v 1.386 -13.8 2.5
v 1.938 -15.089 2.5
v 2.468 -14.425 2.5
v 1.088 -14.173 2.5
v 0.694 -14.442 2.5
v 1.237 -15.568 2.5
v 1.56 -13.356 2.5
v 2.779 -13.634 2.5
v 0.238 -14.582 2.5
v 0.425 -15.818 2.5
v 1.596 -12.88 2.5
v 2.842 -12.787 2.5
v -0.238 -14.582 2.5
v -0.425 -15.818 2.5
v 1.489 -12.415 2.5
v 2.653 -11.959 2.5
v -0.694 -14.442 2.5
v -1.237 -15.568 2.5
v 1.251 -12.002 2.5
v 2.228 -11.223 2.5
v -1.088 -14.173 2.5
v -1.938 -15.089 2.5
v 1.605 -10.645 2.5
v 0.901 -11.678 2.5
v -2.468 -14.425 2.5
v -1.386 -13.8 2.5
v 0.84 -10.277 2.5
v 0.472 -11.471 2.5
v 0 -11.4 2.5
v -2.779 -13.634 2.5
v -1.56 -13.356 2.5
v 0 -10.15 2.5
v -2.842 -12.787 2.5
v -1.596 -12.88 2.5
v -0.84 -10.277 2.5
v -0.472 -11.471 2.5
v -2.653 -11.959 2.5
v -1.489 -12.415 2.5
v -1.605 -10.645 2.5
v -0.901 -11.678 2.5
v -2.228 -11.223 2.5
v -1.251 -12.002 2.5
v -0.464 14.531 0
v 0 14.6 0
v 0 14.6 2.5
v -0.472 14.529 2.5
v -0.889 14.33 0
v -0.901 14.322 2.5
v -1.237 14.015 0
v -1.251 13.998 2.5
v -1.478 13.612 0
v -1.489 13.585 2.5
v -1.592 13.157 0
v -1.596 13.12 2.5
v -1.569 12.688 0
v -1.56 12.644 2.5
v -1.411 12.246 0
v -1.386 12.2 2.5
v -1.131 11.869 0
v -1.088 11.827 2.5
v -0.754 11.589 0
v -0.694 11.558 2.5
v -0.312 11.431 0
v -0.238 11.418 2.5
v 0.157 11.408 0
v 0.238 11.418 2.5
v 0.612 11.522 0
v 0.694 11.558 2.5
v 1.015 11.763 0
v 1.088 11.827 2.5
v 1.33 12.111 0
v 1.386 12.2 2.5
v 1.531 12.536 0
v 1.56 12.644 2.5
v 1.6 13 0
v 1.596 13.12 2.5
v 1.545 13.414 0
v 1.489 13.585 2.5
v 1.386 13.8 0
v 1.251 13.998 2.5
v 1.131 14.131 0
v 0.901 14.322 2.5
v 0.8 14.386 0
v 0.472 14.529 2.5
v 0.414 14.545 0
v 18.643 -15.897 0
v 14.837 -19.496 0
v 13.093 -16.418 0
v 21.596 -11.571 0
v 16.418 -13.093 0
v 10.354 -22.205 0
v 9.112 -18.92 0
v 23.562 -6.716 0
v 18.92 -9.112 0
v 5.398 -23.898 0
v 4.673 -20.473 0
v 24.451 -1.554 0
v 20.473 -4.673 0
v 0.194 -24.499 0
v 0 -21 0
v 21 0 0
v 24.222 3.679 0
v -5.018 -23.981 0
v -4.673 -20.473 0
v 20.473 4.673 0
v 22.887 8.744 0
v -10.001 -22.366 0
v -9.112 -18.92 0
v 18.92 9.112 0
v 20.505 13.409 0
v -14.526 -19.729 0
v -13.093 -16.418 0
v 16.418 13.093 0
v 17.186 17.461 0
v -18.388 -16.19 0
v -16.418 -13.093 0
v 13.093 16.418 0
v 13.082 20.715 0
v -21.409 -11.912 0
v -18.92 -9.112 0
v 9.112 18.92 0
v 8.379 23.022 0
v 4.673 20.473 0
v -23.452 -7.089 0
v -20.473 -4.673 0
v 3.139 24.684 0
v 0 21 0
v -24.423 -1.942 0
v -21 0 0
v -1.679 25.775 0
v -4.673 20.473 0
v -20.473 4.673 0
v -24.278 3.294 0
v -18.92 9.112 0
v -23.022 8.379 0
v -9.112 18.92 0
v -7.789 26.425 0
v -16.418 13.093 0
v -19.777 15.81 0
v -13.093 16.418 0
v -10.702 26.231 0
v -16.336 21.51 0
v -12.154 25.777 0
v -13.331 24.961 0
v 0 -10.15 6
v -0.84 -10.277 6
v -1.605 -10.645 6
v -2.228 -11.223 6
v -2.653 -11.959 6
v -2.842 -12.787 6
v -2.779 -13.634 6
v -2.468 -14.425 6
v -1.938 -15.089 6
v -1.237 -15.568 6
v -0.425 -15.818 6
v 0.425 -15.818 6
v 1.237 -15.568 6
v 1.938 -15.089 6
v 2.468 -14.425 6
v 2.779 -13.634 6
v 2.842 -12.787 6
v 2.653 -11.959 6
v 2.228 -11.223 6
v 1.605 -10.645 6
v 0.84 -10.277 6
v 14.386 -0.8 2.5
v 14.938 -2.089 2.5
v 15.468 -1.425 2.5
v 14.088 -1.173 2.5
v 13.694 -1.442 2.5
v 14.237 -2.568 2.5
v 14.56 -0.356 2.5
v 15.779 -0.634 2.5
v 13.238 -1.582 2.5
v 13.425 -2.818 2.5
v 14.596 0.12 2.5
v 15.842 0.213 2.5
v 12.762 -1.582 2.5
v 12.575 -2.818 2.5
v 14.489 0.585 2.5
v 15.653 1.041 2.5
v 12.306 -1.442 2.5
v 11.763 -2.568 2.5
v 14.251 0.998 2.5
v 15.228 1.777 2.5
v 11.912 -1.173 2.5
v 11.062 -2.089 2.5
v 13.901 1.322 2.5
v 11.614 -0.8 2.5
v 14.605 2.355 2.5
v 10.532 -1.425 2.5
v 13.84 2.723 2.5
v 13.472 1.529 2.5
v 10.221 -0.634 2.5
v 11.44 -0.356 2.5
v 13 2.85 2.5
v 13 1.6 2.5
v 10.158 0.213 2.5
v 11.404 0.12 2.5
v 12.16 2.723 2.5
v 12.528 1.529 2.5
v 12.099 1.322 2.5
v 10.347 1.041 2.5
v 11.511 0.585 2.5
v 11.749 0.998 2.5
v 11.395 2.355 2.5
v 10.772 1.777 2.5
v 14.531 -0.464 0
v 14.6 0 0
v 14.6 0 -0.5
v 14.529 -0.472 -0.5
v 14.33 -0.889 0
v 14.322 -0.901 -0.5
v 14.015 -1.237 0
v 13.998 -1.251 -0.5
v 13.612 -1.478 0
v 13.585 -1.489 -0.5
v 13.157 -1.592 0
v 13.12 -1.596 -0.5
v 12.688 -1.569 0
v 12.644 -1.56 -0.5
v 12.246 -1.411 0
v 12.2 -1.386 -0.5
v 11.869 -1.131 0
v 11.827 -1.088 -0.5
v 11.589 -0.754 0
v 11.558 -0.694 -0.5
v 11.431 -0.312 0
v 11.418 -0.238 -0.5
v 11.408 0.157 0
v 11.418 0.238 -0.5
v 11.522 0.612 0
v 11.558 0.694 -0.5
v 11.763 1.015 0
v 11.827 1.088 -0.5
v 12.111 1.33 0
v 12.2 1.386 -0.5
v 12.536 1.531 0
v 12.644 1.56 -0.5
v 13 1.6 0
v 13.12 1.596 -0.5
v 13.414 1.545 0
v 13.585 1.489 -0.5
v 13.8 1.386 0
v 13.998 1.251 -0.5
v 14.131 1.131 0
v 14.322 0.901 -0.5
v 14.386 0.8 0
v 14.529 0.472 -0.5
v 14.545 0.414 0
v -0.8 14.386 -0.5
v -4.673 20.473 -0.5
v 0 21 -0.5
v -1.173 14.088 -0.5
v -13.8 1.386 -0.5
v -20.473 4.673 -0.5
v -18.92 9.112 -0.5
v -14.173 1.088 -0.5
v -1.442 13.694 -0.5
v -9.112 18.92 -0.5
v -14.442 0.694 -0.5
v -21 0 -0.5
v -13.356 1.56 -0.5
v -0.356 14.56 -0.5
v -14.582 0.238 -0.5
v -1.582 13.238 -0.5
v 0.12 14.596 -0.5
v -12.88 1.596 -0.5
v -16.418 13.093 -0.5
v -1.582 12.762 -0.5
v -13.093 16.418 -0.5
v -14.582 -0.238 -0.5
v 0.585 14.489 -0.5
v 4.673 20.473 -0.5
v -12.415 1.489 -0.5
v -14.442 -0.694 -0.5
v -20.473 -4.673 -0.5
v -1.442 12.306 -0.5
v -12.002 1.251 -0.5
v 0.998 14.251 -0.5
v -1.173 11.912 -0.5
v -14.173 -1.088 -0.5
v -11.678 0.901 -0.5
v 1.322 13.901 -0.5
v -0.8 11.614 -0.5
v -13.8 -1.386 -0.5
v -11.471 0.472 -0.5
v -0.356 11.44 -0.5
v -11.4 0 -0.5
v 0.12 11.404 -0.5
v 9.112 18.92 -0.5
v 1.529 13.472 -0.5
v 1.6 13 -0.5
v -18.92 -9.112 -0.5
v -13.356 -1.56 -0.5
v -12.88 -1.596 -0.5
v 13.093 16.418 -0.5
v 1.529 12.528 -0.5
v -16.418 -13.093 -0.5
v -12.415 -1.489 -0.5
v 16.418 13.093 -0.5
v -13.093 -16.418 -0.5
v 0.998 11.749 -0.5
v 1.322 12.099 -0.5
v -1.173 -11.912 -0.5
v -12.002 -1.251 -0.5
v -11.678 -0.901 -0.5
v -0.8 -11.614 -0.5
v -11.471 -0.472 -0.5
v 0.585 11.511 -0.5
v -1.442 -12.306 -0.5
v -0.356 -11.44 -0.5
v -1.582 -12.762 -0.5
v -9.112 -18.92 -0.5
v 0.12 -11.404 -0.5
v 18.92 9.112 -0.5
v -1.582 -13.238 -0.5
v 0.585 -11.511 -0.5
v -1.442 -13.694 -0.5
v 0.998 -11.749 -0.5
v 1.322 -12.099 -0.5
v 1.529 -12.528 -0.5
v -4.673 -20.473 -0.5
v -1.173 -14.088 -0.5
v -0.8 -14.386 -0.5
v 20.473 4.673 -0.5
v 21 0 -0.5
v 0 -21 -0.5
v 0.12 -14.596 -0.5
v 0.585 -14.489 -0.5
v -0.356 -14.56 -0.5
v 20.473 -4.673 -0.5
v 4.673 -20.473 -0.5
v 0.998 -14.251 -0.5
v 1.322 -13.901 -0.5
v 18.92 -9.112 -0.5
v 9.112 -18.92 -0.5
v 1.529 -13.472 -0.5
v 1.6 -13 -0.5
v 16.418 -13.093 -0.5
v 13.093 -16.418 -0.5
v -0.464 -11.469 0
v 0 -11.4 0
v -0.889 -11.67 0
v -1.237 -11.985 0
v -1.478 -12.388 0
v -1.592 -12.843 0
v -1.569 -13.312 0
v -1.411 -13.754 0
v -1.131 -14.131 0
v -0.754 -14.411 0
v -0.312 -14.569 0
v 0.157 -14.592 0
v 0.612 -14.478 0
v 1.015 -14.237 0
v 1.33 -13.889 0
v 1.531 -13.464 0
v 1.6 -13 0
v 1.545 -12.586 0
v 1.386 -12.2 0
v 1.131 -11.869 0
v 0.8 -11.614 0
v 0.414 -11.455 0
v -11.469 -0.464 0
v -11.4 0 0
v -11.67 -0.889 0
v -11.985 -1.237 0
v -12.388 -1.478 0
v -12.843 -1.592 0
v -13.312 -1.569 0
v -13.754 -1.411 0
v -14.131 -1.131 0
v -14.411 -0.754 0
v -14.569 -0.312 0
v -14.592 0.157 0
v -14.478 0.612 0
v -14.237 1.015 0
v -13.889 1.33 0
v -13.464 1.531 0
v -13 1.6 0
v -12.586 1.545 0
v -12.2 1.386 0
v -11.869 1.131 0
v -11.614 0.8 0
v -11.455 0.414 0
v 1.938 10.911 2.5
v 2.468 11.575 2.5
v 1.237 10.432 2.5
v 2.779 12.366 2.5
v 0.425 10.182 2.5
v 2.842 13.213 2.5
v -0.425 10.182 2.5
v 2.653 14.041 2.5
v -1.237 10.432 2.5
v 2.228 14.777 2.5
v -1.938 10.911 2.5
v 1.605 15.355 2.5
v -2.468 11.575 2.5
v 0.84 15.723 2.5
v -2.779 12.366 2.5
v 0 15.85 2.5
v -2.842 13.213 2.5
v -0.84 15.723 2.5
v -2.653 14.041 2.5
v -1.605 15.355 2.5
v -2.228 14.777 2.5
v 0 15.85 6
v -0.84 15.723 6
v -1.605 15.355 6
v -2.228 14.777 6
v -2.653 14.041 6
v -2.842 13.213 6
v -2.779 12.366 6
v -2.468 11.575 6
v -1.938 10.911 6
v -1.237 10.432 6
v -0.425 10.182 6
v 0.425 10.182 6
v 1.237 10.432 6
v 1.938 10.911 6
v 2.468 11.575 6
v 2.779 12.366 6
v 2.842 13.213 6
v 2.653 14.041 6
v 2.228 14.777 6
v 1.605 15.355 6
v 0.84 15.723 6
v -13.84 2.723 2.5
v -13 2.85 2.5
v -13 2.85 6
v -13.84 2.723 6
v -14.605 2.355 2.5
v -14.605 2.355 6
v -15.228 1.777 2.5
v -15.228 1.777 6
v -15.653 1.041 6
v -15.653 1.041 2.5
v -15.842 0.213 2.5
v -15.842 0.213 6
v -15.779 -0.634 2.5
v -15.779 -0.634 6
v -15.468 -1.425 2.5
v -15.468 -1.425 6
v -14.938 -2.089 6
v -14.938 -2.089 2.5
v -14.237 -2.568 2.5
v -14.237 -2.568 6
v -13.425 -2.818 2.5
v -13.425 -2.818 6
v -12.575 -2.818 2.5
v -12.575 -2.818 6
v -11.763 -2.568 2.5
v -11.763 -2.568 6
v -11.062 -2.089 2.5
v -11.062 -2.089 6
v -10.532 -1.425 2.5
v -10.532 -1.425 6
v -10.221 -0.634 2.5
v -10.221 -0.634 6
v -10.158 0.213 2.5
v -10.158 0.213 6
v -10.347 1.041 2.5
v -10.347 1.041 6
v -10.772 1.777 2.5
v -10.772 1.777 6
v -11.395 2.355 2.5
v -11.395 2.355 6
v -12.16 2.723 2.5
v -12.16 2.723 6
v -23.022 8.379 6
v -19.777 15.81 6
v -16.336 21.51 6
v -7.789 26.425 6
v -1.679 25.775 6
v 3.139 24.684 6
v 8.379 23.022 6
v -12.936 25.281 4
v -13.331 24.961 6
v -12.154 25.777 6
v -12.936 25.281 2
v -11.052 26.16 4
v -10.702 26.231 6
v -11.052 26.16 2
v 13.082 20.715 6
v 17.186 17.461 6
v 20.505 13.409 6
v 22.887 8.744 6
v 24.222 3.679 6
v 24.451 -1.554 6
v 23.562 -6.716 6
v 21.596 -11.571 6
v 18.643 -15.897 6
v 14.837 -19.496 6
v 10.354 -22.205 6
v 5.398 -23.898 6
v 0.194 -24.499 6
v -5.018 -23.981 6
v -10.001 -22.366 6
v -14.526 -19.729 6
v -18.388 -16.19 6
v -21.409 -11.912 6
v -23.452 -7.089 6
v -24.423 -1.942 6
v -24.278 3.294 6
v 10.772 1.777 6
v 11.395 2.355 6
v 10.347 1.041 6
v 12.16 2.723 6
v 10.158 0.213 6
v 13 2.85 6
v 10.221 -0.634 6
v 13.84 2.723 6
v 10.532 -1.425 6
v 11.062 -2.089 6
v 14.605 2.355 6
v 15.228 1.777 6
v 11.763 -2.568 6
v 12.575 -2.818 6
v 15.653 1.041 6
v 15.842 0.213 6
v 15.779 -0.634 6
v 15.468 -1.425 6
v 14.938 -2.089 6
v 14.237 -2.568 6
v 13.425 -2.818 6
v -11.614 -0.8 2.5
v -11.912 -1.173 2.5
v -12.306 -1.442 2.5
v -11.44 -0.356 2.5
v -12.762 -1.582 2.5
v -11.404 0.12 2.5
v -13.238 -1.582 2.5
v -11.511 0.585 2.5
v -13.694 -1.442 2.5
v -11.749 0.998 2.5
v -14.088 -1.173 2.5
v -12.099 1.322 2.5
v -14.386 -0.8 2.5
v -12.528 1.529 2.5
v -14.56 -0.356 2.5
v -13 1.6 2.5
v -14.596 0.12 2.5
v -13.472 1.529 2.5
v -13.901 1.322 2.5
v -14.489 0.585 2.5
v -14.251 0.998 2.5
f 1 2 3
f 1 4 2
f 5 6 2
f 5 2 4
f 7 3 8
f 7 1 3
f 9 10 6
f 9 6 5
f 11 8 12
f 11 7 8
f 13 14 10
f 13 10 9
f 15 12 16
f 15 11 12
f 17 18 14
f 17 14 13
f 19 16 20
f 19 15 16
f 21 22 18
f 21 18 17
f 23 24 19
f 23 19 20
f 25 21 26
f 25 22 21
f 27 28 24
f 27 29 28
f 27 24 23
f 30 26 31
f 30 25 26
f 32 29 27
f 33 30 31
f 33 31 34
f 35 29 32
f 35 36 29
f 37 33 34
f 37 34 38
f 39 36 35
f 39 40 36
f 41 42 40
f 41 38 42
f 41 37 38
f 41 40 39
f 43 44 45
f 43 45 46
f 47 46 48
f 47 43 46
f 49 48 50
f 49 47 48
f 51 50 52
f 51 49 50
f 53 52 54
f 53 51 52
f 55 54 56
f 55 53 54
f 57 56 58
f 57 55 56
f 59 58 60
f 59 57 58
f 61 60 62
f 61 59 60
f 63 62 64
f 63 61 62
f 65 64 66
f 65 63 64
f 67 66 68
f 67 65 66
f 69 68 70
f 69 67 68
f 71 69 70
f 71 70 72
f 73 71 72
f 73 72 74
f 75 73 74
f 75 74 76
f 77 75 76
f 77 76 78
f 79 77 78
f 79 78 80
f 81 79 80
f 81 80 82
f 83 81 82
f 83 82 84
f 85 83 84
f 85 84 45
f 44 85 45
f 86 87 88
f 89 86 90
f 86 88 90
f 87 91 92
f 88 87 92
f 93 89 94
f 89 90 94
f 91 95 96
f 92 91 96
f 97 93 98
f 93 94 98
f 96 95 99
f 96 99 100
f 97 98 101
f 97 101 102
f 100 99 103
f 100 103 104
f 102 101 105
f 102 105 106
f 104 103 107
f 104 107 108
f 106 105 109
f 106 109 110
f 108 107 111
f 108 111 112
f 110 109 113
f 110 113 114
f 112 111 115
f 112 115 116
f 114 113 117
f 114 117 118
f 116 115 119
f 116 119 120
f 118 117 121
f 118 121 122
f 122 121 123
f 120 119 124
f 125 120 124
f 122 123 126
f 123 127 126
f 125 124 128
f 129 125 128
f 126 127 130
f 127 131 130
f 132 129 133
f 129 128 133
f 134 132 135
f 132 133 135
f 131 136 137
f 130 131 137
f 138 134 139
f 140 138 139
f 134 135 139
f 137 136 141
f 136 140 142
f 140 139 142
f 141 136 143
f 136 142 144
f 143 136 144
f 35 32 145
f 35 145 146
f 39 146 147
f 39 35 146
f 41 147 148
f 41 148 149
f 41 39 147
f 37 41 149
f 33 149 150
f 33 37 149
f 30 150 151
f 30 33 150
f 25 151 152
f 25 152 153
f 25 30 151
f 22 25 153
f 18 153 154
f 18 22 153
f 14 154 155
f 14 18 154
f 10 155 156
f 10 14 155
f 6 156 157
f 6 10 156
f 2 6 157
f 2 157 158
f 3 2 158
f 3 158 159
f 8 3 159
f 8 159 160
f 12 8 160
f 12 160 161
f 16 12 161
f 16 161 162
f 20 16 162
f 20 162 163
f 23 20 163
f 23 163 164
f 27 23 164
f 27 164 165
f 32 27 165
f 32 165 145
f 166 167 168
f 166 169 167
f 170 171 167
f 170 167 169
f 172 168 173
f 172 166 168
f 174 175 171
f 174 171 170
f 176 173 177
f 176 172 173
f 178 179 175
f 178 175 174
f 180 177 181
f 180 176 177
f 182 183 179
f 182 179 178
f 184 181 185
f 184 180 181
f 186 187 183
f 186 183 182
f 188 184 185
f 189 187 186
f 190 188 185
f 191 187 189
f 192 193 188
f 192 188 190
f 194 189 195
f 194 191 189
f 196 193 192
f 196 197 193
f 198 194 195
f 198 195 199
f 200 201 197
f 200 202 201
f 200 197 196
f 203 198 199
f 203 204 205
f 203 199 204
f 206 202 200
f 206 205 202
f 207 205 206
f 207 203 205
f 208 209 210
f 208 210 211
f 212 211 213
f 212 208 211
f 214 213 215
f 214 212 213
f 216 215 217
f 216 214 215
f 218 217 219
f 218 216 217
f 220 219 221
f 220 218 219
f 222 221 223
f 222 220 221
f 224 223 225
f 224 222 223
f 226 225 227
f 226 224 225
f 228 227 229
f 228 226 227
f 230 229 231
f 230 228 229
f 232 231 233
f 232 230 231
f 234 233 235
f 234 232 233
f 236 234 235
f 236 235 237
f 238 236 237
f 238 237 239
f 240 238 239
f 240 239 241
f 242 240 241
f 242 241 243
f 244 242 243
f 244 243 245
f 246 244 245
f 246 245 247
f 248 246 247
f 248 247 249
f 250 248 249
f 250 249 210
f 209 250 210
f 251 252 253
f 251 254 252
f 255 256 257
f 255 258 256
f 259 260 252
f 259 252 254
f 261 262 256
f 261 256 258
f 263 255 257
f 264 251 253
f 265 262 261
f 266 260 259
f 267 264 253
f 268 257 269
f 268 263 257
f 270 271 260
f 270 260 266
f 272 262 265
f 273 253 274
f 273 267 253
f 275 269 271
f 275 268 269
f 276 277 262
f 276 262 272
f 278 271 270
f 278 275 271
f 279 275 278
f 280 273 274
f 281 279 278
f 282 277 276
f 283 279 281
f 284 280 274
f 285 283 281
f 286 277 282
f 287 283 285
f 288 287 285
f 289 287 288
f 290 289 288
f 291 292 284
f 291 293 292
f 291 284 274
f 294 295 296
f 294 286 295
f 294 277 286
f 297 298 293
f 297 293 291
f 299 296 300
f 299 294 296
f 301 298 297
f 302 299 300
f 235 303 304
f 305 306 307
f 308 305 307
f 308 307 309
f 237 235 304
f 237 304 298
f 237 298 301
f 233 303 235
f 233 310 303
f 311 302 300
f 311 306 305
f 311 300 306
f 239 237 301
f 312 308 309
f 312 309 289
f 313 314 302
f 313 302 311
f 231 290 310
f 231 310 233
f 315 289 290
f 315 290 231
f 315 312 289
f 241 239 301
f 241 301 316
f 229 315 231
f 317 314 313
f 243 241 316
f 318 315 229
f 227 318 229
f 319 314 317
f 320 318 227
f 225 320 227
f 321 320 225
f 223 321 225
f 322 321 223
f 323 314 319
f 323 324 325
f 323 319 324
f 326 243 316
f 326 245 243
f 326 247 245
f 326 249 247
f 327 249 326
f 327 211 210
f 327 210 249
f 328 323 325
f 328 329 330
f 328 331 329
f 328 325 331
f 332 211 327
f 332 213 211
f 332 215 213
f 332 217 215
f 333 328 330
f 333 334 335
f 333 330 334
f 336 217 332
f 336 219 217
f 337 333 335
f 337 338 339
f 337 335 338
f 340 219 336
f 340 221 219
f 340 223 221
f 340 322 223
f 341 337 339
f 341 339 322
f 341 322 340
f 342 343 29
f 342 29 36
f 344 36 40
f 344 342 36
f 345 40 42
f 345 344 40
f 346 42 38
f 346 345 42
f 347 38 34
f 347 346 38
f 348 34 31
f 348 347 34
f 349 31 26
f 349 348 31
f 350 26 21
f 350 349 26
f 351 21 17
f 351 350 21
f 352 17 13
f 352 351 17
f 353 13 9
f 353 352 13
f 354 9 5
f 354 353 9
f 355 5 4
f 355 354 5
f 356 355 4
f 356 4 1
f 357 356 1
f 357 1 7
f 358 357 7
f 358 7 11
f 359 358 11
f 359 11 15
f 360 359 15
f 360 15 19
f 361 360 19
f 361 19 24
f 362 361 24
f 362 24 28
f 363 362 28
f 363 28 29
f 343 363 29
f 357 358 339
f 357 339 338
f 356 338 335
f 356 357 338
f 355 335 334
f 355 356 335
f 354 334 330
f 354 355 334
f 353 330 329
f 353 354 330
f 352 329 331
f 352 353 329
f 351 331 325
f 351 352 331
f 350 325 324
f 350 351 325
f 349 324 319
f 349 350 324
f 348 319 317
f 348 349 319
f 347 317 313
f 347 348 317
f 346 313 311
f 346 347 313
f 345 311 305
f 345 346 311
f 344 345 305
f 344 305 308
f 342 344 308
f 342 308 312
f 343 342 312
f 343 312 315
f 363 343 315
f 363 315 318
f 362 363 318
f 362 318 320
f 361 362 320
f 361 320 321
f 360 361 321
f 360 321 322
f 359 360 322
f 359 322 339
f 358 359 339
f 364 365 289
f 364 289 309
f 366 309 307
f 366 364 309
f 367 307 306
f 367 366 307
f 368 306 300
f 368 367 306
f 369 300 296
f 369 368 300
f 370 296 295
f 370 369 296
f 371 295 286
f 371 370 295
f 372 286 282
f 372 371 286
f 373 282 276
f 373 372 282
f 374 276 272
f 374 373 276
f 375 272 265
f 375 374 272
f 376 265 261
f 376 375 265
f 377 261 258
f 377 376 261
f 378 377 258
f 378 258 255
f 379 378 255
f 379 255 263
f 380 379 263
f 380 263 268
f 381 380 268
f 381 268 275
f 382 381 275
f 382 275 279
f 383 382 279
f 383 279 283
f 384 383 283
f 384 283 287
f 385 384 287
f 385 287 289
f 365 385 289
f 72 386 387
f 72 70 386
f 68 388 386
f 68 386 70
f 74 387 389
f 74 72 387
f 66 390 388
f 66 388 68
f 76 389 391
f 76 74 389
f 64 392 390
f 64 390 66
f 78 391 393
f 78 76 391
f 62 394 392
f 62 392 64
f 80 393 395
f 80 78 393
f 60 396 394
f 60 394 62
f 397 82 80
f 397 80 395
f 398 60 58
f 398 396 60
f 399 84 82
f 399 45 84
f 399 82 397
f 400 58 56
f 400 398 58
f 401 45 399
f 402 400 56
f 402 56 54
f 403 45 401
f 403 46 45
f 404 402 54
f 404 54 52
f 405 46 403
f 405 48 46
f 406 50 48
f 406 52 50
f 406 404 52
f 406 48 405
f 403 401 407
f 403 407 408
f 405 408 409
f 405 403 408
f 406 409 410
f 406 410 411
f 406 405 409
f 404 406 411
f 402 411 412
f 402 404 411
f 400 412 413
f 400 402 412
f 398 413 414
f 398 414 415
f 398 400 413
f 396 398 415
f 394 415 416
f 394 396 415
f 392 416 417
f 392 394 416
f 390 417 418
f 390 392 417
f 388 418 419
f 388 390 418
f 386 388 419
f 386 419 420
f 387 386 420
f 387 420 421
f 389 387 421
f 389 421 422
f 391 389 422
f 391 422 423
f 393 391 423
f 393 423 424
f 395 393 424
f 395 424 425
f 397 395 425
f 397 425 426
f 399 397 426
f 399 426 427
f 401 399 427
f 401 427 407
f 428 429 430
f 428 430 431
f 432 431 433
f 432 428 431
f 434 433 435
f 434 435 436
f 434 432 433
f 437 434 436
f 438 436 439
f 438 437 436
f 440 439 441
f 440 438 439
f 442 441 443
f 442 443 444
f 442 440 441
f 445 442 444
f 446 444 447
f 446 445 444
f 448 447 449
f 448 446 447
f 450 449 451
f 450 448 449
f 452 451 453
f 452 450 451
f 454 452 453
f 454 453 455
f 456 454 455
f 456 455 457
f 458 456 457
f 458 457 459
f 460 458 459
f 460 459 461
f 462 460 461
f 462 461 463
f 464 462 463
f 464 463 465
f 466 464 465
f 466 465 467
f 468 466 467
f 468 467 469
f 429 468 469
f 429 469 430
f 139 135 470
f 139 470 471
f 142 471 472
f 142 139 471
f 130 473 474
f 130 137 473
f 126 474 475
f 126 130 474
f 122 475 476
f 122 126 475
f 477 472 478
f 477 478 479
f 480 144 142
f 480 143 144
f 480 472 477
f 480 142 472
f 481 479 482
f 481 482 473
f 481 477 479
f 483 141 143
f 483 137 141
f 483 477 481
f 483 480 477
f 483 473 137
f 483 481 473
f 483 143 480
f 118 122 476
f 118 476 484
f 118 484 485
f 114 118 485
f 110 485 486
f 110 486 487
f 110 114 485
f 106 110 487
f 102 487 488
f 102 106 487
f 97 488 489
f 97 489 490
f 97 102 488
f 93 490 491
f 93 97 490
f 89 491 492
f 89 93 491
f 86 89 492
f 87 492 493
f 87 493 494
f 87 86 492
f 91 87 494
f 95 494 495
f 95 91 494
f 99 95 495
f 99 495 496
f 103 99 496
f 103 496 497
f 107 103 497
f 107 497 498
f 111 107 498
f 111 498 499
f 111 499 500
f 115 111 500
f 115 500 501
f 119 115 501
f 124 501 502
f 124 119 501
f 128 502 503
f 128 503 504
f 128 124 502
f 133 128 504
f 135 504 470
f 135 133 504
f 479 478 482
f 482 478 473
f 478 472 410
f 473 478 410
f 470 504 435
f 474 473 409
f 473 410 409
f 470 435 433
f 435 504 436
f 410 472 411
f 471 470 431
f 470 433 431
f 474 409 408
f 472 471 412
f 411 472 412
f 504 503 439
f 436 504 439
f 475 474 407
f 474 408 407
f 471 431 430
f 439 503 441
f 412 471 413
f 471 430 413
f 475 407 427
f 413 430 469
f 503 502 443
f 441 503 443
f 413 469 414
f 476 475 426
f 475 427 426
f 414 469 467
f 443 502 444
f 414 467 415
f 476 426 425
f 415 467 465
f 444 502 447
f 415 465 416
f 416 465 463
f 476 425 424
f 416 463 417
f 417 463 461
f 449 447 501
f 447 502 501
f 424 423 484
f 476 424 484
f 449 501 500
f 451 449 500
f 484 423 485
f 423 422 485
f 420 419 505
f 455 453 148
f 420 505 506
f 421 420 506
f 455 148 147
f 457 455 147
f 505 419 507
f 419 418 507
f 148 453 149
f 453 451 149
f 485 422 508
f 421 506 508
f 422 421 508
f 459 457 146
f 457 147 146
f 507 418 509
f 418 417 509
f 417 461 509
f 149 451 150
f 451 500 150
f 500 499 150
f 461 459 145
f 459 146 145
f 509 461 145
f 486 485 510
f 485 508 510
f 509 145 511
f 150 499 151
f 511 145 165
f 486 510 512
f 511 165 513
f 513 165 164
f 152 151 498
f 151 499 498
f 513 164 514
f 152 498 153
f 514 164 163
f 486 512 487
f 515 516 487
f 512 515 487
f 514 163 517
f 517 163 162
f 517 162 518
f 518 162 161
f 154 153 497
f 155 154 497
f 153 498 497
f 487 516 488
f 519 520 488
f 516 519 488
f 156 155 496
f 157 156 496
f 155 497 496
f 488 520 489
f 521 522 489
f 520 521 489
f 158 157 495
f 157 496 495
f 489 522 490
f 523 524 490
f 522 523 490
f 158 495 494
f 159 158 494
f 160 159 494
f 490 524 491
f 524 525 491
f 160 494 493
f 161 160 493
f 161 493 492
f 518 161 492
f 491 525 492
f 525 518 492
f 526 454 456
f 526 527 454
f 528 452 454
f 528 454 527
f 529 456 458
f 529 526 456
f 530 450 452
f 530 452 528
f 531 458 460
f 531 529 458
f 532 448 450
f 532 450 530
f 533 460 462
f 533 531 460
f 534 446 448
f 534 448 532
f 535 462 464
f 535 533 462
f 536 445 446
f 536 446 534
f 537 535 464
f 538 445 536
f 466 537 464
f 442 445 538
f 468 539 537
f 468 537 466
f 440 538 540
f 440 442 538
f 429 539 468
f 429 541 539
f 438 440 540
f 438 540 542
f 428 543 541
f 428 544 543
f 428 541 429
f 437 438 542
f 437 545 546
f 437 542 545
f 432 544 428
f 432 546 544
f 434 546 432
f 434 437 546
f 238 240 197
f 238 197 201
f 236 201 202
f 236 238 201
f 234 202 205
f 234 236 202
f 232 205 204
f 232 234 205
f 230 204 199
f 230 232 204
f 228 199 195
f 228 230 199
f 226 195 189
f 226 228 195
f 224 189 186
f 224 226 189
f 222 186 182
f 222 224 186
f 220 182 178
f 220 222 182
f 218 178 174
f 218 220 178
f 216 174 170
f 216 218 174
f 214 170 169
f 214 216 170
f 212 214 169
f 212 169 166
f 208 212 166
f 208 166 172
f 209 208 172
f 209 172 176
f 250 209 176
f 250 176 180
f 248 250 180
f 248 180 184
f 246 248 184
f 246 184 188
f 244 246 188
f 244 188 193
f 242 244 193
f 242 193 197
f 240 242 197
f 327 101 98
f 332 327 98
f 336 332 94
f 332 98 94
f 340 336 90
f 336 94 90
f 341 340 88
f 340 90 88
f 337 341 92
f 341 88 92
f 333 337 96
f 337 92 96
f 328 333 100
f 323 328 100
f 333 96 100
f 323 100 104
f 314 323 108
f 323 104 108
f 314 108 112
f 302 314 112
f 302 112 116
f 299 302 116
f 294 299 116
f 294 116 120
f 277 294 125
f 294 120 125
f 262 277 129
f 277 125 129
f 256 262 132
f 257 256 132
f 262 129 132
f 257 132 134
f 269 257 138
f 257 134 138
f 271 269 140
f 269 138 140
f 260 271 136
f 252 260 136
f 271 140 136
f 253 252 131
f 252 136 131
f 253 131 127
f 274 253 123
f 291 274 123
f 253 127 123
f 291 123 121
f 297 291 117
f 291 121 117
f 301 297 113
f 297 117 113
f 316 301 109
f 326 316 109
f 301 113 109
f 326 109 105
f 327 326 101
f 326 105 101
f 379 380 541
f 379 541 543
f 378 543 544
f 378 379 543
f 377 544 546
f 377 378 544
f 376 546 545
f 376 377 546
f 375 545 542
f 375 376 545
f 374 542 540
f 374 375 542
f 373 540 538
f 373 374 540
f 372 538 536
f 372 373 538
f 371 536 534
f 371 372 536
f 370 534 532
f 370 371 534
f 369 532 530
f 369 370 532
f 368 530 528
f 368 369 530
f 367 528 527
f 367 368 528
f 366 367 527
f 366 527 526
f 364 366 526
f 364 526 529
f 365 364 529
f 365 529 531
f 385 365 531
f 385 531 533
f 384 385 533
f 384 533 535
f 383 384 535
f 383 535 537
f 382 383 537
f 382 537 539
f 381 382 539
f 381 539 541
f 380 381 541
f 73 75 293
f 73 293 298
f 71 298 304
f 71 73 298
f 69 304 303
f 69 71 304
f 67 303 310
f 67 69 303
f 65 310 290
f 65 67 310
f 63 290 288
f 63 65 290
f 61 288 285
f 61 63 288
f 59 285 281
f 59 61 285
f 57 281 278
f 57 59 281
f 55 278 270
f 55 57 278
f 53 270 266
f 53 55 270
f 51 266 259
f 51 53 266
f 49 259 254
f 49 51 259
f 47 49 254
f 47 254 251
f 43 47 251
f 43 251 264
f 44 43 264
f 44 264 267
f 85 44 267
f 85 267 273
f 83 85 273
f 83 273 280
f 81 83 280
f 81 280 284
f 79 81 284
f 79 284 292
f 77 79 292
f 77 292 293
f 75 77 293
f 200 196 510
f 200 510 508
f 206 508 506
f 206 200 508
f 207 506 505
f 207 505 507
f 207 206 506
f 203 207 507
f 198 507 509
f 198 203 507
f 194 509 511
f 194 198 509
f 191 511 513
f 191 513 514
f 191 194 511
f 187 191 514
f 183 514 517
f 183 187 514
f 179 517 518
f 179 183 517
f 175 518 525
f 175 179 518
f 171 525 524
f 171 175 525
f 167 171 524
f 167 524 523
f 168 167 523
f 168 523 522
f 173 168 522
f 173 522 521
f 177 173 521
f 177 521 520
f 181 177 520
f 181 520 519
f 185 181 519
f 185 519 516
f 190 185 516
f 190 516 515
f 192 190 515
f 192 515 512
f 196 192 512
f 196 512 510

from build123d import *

# Parameters (mm, degrees)
SKETCH1_R           = 21
SKETCH1_R_2         = 2.85
BOSS_EXTRUDE1_DEPTH = 6
SKETCH2_R           = 24.5
SKETCH2_R_2         = 21
BOSS_EXTRUDE3_DEPTH = 6
SKETCH1_4_R         = 2.85
SKETCH1_4_R_2       = 1.6
BOSS_EXTRUDE2_DEPTH = 2.5
SKETCH3_R           = 21
SKETCH3_R_2         = 1.6
BOSS_EXTRUDE4_DEPTH = 0.5


with BuildPart() as part:
    # Sketch1 → Boss-Extrude1 (new body)
    with BuildSketch(Plane(origin=(0, 0, 0), x_dir=(0, 1, 0), z_dir=(0, 0, 1))):
        Circle(SKETCH1_R)
        with Locations((-13, 0)):
            Circle(SKETCH1_R_2, mode=Mode.SUBTRACT)
        with Locations((0, -13)):
            Circle(SKETCH1_R_2, mode=Mode.SUBTRACT)
        with Locations((13, 0)):
            Circle(SKETCH1_R_2, mode=Mode.SUBTRACT)
        with Locations((0, 13)):
            Circle(SKETCH1_R_2, mode=Mode.SUBTRACT)
    extrude(amount=BOSS_EXTRUDE1_DEPTH)

    # Sketch2 → Boss-Extrude3 (add)
    with BuildSketch(Plane(origin=(0, 0, 0), x_dir=(1, 0, 0), z_dir=(0, 0, -1))):
        Circle(SKETCH2_R)
        Circle(SKETCH2_R_2, mode=Mode.SUBTRACT)
        with BuildLine():
            ThreePointArc((8.379493511, -23.022469209), (-10.354147413, -22.204540782), (-23.022469209, -8.379493511))
            add(Edge.make_bspline(
                [(-23.022469209, -8.379493511), (-19.944287919, -16.836727099), (-14.723681196, -24.624750138), (-9.399453165, -27.107478442), (-0.077740076, -26.100650499), (8.379493511, -23.022469209)],
                knots=[0, 0, 0, 0, 0.45, 0.55, 1, 1, 1, 1], degree=3))
        make_face()
    extrude(amount=-BOSS_EXTRUDE3_DEPTH)

    # Sketch1<4> → Boss-Extrude2 (add)
    with BuildSketch(Plane(origin=(0, 0, 0), x_dir=(0, 1, 0), z_dir=(0, 0, 1))):
        with Locations((-13, 0)):
            Circle(SKETCH1_4_R)
        with Locations((-13, 0)):
            Circle(SKETCH1_4_R_2, mode=Mode.SUBTRACT)
        with Locations((0, 13)):
            Circle(SKETCH1_4_R)
        with Locations((0, 13)):
            Circle(SKETCH1_4_R_2, mode=Mode.SUBTRACT)
        with Locations((13, 0)):
            Circle(SKETCH1_4_R)
        with Locations((13, 0)):
            Circle(SKETCH1_4_R_2, mode=Mode.SUBTRACT)
        with Locations((0, -13)):
            Circle(SKETCH1_4_R)
        with Locations((0, -13)):
            Circle(SKETCH1_4_R_2, mode=Mode.SUBTRACT)
    extrude(amount=BOSS_EXTRUDE2_DEPTH)

    # Sketch3 → Boss-Extrude4 (add)
    with BuildSketch(Plane(origin=(0, 0, 0), x_dir=(1, 0, 0), z_dir=(0, 0, -1))):
        Circle(SKETCH3_R)
        with Locations((13, 0)):
            Circle(SKETCH3_R_2, mode=Mode.SUBTRACT)
        with Locations((0, 13)):
            Circle(SKETCH3_R_2, mode=Mode.SUBTRACT)
        with Locations((-13, 0)):
            Circle(SKETCH3_R_2, mode=Mode.SUBTRACT)
        with Locations((0, -13)):
            Circle(SKETCH3_R_2, mode=Mode.SUBTRACT)
    extrude(amount=BOSS_EXTRUDE4_DEPTH)


solid = part.part
